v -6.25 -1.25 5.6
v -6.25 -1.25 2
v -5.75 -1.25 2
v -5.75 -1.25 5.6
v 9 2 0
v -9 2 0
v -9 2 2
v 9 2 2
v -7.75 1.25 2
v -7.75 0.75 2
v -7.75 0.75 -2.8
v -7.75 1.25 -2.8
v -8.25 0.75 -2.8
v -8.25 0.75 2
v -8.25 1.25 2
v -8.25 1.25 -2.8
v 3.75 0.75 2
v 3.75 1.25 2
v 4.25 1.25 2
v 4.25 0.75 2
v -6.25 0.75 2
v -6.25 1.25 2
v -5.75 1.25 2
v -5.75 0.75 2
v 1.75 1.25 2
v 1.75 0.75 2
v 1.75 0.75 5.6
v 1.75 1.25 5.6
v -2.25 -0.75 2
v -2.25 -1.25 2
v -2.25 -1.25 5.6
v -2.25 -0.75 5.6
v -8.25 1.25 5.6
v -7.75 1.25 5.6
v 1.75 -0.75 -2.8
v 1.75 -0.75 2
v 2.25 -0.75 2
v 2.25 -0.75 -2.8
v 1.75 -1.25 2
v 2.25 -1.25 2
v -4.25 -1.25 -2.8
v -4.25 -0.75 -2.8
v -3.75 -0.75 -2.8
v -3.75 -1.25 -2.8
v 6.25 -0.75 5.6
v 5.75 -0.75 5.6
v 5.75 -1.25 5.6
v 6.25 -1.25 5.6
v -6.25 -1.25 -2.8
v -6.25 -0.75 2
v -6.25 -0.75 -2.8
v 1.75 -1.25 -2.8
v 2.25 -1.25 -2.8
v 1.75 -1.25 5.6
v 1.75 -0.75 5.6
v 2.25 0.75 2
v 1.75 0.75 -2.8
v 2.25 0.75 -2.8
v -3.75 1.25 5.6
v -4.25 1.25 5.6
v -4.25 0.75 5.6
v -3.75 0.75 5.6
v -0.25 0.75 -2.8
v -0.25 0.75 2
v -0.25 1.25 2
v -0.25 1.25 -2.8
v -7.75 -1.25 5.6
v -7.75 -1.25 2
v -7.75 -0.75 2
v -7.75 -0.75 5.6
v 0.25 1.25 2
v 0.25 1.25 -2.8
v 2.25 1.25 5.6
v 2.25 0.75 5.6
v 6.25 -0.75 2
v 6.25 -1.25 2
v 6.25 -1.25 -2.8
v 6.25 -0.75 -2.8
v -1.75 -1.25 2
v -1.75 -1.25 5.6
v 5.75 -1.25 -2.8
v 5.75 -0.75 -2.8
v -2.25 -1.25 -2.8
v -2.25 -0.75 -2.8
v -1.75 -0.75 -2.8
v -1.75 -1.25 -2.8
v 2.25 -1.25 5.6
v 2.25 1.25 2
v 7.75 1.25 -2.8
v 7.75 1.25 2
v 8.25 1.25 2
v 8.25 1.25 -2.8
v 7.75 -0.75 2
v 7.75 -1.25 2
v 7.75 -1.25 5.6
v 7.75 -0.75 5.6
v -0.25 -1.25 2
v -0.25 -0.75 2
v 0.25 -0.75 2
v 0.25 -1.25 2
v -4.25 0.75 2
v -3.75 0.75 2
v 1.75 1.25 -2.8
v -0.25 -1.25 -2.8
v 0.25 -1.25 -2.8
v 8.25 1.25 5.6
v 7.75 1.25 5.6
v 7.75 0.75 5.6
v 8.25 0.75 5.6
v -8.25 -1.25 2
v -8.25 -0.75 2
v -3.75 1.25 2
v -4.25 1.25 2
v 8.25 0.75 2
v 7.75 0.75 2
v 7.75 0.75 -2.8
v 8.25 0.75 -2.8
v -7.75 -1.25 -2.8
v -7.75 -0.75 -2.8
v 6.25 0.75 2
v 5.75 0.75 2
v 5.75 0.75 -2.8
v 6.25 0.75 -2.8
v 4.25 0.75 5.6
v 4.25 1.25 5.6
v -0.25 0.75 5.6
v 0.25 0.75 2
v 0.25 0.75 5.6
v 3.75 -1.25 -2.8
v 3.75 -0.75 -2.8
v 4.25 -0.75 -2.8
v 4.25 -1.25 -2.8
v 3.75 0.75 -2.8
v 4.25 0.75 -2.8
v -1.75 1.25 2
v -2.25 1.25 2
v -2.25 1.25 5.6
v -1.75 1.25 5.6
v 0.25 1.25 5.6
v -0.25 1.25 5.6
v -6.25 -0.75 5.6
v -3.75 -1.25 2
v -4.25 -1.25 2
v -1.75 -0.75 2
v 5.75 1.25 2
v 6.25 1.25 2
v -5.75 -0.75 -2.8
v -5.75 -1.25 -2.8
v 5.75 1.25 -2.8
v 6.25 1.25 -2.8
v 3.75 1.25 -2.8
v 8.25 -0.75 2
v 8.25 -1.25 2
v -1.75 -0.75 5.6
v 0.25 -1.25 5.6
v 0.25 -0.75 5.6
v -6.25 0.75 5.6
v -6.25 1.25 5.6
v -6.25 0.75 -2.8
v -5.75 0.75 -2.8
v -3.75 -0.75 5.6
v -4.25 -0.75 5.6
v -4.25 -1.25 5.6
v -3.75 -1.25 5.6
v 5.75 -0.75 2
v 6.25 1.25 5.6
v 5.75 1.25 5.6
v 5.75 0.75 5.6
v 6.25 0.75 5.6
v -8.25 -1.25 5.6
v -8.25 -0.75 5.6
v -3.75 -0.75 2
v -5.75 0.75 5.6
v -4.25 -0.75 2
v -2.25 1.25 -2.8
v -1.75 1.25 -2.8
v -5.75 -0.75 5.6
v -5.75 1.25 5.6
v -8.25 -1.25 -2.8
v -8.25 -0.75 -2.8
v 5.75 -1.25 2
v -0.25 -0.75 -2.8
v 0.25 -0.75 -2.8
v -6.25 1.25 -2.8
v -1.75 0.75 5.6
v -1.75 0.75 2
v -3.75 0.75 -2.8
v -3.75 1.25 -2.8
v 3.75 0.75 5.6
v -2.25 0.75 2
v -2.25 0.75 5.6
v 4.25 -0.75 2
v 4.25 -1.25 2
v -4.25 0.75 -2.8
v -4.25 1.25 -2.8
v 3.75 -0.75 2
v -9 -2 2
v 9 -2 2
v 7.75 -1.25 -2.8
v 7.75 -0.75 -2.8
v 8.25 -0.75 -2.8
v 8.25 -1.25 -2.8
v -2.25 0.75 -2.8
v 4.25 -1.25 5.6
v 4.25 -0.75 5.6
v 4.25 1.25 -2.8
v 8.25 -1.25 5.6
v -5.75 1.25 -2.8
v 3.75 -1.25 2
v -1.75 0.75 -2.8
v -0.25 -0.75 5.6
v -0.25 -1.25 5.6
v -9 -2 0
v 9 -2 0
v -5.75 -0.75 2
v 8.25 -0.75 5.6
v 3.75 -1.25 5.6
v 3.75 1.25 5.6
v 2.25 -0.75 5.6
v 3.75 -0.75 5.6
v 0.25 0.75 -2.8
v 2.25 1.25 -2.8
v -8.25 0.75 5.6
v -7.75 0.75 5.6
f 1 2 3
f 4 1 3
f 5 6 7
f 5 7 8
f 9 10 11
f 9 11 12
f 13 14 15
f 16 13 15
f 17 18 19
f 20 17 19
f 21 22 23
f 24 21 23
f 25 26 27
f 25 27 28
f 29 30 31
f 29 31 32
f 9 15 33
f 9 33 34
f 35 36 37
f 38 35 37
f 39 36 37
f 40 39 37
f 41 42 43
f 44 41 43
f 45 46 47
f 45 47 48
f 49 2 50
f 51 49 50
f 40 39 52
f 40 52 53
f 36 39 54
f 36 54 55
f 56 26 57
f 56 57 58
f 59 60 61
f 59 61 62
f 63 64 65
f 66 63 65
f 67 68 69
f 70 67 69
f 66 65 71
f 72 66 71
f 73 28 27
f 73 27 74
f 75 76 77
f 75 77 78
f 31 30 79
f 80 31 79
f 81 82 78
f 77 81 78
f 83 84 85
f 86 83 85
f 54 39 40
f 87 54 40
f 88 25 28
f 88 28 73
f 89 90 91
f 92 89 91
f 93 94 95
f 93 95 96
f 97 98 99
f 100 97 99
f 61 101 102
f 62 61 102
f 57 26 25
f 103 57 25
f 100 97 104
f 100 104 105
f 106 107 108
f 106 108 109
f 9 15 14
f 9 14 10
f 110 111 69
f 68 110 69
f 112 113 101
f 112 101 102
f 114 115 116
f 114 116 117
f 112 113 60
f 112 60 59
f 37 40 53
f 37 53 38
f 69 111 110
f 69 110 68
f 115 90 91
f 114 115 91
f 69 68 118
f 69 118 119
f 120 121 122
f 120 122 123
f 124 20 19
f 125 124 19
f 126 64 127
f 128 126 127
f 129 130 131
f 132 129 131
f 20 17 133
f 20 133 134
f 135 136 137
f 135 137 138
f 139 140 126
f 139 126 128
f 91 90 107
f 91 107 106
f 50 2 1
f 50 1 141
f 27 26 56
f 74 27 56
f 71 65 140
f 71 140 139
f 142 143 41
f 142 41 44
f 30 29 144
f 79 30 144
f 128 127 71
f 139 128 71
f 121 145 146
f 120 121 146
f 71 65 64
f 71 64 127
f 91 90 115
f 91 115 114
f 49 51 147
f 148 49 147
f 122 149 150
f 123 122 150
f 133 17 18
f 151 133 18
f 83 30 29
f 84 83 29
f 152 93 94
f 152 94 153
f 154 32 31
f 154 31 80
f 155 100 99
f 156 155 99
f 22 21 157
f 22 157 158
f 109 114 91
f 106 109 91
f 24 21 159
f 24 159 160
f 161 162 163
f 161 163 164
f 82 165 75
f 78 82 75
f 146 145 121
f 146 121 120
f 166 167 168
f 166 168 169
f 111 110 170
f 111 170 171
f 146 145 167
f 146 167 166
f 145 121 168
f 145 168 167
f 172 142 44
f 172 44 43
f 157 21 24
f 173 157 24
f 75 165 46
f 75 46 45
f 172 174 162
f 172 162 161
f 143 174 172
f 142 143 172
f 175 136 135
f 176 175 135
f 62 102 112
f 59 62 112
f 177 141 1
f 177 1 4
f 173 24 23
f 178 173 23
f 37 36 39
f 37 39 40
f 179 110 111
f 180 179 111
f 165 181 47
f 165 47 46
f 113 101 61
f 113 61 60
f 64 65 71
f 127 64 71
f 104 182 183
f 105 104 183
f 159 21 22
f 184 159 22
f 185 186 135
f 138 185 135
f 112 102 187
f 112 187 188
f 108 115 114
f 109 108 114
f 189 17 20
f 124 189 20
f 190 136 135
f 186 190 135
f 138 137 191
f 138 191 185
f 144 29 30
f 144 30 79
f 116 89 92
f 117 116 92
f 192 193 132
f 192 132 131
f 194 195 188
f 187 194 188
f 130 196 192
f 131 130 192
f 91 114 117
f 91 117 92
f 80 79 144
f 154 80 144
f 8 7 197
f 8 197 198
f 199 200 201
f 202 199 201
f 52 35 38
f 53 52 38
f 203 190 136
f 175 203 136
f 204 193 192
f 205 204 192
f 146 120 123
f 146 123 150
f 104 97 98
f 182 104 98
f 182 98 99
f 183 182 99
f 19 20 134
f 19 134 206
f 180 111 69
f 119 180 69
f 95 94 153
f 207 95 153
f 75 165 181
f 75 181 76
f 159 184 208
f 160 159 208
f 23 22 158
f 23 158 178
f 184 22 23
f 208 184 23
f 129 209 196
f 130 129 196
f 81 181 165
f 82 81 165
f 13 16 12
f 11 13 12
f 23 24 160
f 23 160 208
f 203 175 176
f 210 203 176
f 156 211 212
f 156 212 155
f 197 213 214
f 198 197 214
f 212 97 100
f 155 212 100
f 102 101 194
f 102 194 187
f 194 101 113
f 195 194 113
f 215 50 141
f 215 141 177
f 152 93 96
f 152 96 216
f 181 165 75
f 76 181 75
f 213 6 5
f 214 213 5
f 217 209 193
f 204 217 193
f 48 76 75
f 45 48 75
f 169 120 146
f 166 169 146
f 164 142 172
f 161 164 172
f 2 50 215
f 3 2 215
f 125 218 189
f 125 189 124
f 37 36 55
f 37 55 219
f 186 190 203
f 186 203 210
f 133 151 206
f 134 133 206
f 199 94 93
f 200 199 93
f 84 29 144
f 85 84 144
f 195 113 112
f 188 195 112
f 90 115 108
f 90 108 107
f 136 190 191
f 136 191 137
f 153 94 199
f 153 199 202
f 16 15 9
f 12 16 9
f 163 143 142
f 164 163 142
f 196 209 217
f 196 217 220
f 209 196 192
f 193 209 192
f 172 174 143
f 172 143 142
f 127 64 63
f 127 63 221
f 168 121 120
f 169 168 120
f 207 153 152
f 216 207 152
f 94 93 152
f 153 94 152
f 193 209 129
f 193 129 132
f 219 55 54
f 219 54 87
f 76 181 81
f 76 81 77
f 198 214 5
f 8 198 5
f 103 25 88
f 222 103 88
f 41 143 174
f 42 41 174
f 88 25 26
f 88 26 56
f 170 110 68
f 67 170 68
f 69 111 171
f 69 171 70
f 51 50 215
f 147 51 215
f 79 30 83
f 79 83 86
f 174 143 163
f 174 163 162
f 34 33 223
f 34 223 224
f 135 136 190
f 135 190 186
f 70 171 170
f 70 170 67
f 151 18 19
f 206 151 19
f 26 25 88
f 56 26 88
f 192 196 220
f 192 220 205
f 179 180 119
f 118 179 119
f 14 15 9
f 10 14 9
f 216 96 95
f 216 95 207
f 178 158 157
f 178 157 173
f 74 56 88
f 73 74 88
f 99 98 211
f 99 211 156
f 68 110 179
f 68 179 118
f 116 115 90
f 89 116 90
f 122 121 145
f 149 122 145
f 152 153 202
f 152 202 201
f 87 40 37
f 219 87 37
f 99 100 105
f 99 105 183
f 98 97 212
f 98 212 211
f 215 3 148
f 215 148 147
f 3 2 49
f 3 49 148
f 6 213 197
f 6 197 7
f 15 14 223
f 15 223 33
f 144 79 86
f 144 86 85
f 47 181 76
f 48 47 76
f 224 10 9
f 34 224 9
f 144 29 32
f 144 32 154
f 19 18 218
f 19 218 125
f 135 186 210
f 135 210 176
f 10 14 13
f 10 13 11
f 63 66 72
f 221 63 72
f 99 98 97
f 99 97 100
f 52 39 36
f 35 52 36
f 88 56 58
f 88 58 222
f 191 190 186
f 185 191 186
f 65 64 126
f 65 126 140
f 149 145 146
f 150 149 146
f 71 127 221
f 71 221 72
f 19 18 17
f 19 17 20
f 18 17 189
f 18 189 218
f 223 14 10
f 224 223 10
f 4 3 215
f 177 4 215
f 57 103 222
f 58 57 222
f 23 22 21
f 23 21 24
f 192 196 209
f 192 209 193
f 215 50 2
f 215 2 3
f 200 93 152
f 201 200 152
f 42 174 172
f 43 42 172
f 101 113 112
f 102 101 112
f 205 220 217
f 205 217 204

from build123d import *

# Parameters (mm, degrees)
F0_W     = 18
F0_H     = 4
F1_DEPTH = 2
F2_W     = 0.5
F2_H     = 0.5
F3_DEPTH = 3.6
F4_DEPTH = 4.8


with BuildPart() as f1:
    # F0 (on Top) → F1 (new body)
    with BuildSketch(Plane.XY):
        Rectangle(F0_W, F0_H)
    extrude(amount=F1_DEPTH)


with BuildPart() as f3:
    # F2 (on face) → F3 (new body)
    with BuildSketch(Plane.XY.offset(2)):
        with Locations((0, 1)):
            Rectangle(F2_W, F2_H)
        with Locations((0, -1)):
            Rectangle(F2_W, F2_H)
        with Locations((-2, -1)):
            Rectangle(F2_W, F2_H)
        with Locations((-2, 1)):
            Rectangle(F2_W, F2_H)
        with Locations((-4, -1)):
            Rectangle(F2_W, F2_H)
        with Locations((-4, 1)):
            Rectangle(F2_W, F2_H)
        with Locations((-6, -1)):
            Rectangle(F2_W, F2_H)
        with Locations((-6, 1)):
            Rectangle(F2_W, F2_H)
        with Locations((-8, 1)):
            Rectangle(F2_W, F2_H)
        with Locations((-8, -1)):
            Rectangle(F2_W, F2_H)
        with Locations((8, 1)):
            Rectangle(F2_W, F2_H)
        with Locations((6, -1)):
            Rectangle(F2_W, F2_H)
        with Locations((4, 1)):
            Rectangle(F2_W, F2_H)
        with Locations((4, -1)):
            Rectangle(F2_W, F2_H)
        with Locations((6, 1)):
            Rectangle(F2_W, F2_H)
        with Locations((8, -1)):
            Rectangle(F2_W, F2_H)
        with Locations((2, 1)):
            Rectangle(F2_W, F2_H)
        with Locations((2, -1)):
            Rectangle(F2_W, F2_H)
    extrude(amount=F3_DEPTH)


with BuildPart() as f4:
    # F2 (on face) → F4 (new body)
    with BuildSketch(Plane.XY.offset(2)):
        with Locations((0, 1)):
            Rectangle(F2_W, F2_H)
        with Locations((0, -1)):
            Rectangle(F2_W, F2_H)
        with Locations((-2, -1)):
            Rectangle(F2_W, F2_H)
        with Locations((-2, 1)):
            Rectangle(F2_W, F2_H)
        with Locations((-4, -1)):
            Rectangle(F2_W, F2_H)
        with Locations((-4, 1)):
            Rectangle(F2_W, F2_H)
        with Locations((-6, -1)):
            Rectangle(F2_W, F2_H)
        with Locations((-6, 1)):
            Rectangle(F2_W, F2_H)
        with Locations((-8, 1)):
            Rectangle(F2_W, F2_H)
        with Locations((-8, -1)):
            Rectangle(F2_W, F2_H)
        with Locations((8, 1)):
            Rectangle(F2_W, F2_H)
        with Locations((6, -1)):
            Rectangle(F2_W, F2_H)
        with Locations((4, 1)):
            Rectangle(F2_W, F2_H)
        with Locations((4, -1)):
            Rectangle(F2_W, F2_H)
        with Locations((6, 1)):
            Rectangle(F2_W, F2_H)
        with Locations((8, -1)):
            Rectangle(F2_W, F2_H)
        with Locations((2, 1)):
            Rectangle(F2_W, F2_H)
        with Locations((2, -1)):
            Rectangle(F2_W, F2_H)
    extrude(amount=-F4_DEPTH)


solid = Compound([f1.part, f3.part, f4.part])
